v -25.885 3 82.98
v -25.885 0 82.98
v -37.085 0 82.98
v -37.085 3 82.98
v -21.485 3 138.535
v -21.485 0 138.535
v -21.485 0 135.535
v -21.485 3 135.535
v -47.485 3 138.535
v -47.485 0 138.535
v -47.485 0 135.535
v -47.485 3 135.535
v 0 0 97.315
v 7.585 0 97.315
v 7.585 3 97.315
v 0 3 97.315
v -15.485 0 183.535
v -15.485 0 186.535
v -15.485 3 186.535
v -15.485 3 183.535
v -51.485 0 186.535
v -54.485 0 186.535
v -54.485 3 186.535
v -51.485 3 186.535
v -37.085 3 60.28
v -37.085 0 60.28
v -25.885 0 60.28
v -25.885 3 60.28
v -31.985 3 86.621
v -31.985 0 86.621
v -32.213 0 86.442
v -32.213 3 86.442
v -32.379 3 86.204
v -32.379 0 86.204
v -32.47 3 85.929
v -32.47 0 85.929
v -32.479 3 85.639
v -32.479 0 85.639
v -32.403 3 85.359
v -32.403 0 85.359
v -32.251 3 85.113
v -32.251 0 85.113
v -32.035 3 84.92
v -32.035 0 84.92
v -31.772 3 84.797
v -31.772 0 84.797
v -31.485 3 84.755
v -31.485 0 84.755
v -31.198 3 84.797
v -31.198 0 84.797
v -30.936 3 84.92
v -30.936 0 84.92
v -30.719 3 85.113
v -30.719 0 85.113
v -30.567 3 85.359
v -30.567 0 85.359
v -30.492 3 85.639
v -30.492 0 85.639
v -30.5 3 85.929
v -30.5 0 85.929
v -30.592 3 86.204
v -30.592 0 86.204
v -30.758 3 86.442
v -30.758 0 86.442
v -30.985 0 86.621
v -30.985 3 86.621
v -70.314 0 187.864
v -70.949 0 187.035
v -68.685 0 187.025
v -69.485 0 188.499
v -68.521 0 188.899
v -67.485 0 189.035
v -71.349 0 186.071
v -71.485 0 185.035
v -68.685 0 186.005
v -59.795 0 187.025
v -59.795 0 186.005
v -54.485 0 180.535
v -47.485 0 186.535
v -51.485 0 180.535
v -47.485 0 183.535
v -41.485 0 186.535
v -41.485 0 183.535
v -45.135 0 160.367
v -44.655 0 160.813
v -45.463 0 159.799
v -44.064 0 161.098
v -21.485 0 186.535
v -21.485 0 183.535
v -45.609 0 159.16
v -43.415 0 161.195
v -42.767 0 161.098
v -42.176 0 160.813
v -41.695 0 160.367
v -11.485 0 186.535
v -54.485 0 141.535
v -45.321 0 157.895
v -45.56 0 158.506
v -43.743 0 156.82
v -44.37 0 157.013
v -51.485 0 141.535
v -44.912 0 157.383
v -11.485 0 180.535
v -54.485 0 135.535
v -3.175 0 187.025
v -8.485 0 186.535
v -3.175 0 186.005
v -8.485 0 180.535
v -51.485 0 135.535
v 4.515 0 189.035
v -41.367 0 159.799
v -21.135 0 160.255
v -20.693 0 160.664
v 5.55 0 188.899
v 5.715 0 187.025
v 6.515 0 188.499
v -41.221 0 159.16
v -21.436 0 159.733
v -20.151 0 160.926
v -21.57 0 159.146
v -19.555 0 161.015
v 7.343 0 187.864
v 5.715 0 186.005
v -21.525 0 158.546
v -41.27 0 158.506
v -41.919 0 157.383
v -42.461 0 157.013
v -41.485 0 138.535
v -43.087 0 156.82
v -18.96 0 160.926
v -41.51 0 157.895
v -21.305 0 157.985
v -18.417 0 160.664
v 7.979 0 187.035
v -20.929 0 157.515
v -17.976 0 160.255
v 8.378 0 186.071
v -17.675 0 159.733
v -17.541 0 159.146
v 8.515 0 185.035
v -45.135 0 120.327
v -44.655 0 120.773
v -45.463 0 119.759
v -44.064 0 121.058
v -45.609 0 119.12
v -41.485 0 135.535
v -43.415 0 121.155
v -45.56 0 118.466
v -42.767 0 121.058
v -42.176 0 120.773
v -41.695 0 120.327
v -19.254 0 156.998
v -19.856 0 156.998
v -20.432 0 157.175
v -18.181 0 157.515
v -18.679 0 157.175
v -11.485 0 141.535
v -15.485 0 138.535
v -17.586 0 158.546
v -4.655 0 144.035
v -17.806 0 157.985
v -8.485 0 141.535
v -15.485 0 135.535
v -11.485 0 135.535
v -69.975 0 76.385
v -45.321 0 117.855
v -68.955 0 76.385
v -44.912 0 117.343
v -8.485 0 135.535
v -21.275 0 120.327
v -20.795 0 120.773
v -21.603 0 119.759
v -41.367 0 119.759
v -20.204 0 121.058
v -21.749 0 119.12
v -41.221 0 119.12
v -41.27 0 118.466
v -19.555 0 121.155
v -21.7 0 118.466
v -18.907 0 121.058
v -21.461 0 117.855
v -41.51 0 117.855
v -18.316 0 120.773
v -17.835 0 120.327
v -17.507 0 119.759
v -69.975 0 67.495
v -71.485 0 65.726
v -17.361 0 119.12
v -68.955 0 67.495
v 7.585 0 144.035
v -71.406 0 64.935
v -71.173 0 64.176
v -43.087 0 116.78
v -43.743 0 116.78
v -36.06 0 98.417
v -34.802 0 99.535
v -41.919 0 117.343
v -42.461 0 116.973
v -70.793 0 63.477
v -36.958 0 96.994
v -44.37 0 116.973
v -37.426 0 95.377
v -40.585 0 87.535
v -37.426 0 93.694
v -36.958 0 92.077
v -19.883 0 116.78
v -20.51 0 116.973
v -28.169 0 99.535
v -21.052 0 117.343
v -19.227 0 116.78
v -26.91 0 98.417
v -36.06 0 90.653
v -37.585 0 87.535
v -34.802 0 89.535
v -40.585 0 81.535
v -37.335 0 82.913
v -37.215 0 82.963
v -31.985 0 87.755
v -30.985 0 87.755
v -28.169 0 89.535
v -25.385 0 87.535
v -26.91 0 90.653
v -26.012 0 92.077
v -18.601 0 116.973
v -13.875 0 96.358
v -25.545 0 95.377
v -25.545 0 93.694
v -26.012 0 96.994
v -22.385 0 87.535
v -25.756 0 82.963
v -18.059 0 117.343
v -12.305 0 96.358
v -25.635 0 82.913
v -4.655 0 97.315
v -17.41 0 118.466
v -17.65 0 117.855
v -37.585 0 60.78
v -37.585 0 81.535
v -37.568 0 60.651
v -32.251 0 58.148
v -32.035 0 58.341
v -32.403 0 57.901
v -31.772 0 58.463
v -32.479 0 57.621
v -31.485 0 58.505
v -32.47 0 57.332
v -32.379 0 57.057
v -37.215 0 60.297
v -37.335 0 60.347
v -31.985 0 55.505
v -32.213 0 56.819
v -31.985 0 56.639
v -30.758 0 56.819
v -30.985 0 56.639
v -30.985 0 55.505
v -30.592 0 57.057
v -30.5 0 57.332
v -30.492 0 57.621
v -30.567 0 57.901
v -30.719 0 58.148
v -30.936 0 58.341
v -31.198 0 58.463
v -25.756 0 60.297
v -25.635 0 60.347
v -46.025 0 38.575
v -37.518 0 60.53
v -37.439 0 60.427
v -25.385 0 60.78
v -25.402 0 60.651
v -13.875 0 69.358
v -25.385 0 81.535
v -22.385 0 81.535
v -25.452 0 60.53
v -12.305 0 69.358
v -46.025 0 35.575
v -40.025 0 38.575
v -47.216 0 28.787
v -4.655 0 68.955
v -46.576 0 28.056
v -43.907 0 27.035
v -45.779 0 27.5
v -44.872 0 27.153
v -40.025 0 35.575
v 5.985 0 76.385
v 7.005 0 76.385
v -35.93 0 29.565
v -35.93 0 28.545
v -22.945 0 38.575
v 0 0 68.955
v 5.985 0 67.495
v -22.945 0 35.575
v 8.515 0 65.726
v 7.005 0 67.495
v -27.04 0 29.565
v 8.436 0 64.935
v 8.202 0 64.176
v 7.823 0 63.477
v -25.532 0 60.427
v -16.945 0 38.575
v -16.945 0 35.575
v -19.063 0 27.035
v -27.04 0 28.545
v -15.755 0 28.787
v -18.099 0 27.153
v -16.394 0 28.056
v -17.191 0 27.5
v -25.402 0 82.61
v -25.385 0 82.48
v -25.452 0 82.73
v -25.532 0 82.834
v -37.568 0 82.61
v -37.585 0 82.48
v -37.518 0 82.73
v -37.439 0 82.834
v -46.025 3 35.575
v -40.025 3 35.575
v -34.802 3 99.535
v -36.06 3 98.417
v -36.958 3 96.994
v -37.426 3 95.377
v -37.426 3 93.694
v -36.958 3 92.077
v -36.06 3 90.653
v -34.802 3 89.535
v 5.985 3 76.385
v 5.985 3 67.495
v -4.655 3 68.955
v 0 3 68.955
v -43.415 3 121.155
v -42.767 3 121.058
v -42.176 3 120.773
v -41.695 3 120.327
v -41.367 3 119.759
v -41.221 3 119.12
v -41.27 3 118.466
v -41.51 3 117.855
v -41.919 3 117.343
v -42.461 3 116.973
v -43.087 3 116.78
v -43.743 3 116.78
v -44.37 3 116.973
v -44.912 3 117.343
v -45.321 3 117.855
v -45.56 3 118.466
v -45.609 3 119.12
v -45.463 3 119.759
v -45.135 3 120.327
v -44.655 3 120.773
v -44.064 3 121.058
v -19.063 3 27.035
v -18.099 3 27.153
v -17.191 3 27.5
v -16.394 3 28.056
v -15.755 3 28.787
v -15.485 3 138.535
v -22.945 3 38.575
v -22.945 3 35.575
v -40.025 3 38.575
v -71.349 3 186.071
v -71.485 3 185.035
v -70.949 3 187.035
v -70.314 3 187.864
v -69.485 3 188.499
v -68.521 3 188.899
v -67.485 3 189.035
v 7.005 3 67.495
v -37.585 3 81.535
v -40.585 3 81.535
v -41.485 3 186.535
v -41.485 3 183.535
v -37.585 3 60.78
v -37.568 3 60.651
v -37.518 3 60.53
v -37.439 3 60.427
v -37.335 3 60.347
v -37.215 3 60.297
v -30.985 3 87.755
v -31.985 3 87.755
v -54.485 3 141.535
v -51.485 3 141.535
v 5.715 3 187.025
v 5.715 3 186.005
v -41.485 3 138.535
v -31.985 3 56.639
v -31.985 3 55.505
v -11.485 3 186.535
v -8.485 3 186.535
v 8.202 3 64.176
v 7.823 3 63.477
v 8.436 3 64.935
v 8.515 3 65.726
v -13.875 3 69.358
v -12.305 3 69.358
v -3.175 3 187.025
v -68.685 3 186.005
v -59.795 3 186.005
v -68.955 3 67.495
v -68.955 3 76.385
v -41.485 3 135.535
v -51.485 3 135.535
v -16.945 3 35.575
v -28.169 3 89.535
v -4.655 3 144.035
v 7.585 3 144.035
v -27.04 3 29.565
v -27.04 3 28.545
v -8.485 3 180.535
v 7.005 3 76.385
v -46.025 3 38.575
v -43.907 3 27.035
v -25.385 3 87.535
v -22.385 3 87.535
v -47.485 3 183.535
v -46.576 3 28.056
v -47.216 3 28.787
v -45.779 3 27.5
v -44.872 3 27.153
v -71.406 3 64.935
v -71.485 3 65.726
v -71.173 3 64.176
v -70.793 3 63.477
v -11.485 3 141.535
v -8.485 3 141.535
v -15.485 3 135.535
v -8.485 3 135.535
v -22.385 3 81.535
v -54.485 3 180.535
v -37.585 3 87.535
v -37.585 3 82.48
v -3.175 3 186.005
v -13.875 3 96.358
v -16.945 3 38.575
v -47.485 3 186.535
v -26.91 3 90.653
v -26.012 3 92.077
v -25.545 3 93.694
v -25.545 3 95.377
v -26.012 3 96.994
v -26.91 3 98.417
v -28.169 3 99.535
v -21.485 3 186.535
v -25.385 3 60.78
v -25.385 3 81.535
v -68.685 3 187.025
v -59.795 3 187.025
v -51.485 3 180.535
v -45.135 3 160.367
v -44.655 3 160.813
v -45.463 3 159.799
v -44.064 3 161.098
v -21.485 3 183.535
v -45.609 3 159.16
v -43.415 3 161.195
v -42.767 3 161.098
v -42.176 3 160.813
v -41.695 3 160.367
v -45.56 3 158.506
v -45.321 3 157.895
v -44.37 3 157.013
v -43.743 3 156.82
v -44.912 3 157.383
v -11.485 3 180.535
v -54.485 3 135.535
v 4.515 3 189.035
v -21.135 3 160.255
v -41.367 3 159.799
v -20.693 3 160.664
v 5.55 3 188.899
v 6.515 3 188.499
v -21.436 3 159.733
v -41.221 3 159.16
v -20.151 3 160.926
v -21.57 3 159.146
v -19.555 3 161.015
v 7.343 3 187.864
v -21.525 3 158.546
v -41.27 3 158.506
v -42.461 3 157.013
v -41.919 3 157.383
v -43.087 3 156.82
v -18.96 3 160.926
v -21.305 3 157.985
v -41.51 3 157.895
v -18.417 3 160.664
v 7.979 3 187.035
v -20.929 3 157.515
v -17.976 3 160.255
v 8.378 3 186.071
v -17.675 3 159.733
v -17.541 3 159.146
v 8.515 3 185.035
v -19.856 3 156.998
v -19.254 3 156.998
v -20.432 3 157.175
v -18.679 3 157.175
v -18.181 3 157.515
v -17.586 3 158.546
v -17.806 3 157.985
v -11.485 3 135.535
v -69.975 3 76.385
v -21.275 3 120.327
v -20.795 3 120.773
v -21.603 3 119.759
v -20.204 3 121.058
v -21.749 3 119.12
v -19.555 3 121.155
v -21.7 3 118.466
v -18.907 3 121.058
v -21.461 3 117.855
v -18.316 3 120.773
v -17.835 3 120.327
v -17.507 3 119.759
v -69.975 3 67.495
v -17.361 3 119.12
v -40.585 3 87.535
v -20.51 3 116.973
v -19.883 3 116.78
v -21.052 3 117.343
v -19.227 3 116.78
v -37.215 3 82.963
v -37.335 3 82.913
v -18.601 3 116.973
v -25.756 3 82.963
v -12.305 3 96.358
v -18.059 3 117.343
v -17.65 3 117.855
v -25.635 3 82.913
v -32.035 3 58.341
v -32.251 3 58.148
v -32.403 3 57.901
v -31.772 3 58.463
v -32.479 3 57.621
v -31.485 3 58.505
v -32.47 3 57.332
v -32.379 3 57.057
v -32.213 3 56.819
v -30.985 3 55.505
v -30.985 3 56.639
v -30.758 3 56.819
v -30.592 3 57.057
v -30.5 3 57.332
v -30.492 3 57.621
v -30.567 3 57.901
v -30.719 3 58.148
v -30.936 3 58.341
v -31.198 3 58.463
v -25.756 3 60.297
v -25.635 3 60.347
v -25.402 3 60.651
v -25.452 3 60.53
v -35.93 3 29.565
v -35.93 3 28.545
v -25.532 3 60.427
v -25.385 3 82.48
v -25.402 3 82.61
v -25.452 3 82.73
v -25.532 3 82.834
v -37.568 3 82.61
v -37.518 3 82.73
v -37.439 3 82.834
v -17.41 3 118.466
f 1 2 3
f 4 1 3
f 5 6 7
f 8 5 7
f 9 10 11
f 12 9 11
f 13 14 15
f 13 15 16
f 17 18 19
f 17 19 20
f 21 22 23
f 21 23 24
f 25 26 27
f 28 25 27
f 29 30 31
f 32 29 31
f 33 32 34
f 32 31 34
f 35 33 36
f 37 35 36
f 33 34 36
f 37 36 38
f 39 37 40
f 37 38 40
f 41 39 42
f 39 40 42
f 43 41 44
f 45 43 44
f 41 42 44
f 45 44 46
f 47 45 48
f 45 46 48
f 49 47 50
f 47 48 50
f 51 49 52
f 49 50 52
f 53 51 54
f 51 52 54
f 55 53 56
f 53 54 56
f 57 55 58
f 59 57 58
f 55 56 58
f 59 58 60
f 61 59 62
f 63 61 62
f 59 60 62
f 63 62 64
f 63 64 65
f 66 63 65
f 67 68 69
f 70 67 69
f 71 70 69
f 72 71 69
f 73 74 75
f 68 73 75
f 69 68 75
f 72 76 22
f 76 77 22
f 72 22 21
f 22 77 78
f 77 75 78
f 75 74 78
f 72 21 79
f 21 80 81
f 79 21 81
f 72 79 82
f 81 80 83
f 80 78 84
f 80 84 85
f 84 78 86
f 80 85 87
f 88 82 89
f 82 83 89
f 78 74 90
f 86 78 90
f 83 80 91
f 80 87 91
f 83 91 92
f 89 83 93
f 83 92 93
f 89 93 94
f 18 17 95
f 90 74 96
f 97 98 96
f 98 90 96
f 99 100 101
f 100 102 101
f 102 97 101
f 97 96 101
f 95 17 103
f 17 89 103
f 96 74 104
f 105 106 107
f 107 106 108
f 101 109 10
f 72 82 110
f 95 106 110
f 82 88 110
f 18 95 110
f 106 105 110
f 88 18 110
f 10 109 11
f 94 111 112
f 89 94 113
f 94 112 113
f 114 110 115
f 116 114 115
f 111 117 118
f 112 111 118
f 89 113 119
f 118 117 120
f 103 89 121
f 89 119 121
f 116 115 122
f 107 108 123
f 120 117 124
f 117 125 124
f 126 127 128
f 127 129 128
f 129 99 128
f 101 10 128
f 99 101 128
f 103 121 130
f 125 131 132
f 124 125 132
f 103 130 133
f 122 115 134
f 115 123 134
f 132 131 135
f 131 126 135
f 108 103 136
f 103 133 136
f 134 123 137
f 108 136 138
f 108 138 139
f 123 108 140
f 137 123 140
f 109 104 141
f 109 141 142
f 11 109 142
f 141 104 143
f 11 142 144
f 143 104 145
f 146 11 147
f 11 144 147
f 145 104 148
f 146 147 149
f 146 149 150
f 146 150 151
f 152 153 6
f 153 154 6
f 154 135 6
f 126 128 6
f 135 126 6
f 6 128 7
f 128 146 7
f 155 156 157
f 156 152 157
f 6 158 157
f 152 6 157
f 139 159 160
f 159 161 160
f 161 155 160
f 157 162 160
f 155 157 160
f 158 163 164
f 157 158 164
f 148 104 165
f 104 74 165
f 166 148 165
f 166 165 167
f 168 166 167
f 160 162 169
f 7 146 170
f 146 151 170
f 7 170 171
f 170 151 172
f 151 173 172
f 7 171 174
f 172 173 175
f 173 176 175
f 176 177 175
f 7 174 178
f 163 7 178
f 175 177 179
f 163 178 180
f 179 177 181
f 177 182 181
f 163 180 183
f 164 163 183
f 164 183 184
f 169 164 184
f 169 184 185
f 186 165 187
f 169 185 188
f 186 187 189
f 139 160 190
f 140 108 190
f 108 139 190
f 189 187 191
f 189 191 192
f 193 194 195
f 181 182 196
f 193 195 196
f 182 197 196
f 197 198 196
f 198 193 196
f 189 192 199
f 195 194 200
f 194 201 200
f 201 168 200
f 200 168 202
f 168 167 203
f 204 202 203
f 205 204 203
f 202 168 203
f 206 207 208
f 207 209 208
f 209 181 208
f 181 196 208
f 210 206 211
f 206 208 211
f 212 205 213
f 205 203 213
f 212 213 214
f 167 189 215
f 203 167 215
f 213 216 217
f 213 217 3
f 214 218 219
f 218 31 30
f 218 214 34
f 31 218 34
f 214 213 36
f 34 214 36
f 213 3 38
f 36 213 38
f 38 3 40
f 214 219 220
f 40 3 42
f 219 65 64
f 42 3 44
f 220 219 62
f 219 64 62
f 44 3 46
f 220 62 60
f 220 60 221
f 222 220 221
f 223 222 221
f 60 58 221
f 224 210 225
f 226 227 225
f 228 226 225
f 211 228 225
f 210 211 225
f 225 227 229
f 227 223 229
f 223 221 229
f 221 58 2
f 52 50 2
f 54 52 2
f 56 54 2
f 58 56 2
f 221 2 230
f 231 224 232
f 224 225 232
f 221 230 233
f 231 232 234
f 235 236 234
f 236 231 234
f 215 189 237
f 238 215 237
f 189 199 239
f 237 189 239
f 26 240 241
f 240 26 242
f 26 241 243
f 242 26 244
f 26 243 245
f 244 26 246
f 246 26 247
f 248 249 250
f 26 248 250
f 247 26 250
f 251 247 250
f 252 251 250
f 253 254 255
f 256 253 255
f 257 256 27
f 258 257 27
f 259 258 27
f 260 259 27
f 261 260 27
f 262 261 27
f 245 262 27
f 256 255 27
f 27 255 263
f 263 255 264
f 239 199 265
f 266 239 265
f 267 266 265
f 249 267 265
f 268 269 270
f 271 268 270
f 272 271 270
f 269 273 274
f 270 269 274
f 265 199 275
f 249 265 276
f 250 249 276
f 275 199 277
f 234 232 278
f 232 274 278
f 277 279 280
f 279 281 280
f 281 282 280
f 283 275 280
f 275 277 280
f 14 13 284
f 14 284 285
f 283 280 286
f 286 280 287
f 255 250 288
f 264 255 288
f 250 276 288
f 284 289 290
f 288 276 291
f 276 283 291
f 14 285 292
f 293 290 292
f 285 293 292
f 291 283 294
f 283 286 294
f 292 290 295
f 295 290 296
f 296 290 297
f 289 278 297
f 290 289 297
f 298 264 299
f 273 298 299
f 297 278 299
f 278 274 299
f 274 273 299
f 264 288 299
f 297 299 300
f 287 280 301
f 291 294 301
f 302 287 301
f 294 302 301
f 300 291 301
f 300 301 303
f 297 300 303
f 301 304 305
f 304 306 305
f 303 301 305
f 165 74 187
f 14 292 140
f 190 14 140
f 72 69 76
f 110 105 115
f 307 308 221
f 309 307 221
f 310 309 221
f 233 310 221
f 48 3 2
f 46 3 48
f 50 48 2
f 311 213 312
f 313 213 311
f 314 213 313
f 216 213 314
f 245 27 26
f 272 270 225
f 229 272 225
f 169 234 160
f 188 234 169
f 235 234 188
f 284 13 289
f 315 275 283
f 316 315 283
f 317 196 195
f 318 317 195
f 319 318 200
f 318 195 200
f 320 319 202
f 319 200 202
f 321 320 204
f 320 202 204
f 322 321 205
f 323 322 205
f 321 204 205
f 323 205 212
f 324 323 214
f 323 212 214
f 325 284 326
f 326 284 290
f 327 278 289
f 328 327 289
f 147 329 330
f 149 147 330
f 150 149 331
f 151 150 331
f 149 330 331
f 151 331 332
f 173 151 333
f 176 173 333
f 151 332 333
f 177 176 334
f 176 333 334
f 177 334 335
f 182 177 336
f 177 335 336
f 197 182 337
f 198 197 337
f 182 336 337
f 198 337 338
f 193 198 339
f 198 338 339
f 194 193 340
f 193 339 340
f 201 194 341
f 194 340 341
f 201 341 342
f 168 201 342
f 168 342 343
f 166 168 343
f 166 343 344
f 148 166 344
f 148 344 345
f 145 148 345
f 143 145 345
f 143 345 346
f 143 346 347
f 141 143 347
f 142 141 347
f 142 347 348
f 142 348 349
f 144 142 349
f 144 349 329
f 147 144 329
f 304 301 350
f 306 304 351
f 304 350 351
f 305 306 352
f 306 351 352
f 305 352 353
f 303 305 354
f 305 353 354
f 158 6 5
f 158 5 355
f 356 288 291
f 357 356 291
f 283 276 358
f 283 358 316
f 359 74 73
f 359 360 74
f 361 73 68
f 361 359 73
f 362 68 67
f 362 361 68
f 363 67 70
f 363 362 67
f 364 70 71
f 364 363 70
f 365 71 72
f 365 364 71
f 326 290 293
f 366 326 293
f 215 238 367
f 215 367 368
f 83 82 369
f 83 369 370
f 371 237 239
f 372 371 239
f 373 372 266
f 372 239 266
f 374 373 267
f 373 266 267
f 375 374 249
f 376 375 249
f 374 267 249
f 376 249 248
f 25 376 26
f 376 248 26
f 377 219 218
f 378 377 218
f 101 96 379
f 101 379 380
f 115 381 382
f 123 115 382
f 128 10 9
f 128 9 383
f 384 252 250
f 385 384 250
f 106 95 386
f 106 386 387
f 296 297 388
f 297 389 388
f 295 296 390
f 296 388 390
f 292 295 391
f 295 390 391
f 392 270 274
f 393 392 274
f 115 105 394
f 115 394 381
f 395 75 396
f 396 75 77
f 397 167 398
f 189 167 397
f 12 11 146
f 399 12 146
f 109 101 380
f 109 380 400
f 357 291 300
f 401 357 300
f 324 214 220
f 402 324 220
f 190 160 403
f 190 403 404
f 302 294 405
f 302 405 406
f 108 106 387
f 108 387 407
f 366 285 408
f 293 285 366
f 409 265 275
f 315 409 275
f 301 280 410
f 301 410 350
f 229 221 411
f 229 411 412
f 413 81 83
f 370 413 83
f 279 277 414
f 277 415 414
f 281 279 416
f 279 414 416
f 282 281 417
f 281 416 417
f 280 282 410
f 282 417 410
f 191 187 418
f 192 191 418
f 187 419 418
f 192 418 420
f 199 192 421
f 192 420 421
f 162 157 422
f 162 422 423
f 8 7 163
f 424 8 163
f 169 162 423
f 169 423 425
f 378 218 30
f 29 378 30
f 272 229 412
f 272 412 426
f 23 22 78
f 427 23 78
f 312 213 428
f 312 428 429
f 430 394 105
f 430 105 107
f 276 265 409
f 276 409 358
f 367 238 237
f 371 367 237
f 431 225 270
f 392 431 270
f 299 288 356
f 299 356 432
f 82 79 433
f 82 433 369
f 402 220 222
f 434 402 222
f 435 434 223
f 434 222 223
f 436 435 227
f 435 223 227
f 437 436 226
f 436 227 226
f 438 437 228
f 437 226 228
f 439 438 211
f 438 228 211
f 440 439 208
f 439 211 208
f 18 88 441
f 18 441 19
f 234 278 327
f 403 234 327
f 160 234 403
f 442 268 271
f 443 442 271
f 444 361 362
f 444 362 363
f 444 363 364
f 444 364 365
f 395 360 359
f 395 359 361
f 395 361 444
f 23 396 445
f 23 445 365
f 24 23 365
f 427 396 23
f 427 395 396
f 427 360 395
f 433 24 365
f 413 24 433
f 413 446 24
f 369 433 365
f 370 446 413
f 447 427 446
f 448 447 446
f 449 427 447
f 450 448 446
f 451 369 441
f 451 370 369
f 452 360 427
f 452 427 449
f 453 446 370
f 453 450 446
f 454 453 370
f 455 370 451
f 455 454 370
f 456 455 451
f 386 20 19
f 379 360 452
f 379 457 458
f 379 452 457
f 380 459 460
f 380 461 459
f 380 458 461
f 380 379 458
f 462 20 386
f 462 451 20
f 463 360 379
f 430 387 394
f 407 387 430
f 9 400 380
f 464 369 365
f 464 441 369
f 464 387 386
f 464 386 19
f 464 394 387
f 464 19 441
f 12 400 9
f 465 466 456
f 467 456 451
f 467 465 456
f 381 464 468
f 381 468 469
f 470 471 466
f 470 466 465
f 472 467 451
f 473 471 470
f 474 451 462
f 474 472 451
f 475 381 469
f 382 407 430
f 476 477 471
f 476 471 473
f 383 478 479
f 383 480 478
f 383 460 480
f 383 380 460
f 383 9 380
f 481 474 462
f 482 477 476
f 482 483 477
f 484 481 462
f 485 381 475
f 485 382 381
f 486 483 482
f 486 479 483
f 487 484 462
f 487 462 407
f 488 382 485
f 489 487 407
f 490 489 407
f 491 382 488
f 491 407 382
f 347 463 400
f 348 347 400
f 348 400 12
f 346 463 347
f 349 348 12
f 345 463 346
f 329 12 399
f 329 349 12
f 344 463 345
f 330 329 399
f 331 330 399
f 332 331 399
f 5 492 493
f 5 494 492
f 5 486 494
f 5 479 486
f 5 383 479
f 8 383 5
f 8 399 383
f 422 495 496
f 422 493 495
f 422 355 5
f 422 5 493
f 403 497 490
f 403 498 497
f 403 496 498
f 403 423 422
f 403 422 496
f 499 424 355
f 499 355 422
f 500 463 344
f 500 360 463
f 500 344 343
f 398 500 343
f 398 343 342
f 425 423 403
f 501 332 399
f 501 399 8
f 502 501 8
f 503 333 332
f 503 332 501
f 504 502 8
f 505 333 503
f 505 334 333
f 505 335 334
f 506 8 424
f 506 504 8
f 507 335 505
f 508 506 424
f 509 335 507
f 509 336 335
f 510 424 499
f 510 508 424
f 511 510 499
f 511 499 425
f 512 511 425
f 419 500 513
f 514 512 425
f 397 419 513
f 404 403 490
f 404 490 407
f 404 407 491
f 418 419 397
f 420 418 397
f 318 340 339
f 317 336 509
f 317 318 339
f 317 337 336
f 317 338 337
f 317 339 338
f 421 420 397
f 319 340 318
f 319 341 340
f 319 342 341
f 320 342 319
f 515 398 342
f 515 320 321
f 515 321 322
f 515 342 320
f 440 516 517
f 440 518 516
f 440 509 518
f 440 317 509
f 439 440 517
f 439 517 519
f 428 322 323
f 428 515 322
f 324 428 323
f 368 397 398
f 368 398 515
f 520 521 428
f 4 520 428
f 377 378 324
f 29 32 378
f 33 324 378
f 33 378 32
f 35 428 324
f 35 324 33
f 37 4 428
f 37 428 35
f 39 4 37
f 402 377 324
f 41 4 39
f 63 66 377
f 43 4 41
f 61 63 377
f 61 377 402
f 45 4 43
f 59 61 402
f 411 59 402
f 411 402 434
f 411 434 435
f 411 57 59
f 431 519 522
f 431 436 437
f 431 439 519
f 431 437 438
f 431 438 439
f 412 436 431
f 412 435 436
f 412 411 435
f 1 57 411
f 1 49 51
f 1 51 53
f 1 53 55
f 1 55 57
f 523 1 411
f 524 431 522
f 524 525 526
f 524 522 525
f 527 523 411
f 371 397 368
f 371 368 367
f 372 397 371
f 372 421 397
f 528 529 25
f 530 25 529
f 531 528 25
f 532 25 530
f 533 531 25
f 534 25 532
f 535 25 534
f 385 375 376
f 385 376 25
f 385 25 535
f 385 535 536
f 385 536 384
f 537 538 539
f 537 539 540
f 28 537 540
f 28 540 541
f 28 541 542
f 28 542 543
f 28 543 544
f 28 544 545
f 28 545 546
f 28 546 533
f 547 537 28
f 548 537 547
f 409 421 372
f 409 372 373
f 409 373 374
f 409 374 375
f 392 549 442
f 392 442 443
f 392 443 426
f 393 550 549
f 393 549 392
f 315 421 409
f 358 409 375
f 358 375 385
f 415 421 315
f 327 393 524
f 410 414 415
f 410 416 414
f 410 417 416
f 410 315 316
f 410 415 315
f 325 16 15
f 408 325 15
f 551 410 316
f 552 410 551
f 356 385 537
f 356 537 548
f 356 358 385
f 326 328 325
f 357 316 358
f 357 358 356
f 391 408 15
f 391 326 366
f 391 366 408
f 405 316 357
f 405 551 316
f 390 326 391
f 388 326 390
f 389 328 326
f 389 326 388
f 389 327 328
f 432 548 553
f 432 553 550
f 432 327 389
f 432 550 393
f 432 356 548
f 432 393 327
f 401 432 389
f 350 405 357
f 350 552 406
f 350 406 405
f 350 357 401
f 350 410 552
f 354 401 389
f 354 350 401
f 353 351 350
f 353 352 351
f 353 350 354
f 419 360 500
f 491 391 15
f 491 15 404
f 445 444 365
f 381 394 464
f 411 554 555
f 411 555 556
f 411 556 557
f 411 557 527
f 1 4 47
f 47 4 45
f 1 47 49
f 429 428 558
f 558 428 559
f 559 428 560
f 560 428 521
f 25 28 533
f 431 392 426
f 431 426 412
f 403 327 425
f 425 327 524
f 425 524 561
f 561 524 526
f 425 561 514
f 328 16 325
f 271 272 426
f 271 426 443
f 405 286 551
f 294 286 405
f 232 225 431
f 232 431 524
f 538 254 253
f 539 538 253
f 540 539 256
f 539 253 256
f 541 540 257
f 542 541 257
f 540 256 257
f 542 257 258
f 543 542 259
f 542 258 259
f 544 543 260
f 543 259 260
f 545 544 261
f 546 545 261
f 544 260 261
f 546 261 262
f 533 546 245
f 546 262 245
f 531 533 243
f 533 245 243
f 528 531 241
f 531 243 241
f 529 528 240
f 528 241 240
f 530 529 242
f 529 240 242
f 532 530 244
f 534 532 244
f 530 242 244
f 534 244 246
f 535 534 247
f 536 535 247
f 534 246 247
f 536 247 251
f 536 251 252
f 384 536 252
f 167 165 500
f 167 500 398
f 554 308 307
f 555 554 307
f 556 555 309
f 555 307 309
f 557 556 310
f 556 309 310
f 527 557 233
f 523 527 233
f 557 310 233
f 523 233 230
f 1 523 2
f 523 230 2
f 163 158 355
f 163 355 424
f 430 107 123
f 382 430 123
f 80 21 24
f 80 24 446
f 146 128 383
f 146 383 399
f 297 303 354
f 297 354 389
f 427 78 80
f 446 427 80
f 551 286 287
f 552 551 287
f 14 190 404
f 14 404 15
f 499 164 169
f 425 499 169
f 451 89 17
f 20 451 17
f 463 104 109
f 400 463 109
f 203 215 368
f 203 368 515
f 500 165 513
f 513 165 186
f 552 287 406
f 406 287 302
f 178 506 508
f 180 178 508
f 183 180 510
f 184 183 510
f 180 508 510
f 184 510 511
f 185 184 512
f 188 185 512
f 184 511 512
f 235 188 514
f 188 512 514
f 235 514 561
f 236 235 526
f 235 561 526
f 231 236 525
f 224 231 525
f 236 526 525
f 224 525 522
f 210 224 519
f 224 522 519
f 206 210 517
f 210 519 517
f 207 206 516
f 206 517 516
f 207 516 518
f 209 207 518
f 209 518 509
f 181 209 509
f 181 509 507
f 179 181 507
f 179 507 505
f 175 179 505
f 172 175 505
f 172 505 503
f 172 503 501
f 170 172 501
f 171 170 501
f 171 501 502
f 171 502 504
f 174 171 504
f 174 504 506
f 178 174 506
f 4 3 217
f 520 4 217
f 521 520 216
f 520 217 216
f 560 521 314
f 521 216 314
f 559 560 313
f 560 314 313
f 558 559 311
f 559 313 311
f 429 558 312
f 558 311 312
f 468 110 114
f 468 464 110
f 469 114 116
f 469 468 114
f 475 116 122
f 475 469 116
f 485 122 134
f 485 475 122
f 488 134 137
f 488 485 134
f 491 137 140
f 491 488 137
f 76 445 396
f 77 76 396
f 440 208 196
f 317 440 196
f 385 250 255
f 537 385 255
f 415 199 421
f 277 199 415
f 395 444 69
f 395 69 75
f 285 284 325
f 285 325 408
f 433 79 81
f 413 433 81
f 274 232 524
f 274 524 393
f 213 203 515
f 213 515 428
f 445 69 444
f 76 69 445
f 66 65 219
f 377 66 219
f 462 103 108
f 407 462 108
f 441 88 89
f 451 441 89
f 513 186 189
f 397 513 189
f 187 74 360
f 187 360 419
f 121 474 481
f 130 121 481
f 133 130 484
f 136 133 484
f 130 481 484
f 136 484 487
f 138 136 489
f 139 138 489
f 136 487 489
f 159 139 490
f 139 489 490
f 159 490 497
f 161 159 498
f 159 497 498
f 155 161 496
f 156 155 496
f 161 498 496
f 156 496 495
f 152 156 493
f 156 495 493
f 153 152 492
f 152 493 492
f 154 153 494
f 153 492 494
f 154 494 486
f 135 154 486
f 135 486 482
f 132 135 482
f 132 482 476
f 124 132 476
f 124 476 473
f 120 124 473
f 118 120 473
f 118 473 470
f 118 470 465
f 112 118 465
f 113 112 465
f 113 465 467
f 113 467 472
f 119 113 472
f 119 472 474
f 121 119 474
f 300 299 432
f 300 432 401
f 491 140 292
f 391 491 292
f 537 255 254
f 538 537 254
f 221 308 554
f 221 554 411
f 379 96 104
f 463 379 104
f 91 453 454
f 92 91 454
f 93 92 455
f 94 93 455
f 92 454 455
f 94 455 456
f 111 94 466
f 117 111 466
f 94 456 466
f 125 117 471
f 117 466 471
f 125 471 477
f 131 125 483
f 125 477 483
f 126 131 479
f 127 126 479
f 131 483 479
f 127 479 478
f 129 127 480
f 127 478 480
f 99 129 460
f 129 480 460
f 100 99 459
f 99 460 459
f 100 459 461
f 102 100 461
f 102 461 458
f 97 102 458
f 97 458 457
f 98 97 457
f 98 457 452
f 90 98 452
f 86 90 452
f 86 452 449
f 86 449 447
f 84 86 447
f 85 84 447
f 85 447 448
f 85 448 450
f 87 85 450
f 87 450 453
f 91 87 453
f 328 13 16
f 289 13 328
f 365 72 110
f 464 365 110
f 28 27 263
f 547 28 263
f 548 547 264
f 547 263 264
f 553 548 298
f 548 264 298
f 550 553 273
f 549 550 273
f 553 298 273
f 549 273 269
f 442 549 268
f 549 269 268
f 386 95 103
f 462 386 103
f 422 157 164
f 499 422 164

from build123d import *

# Parameters (mm, degrees)
BOSS_EXTRUDE5_OUTLINE_W   = 80
BOSS_EXTRUDE5_OUTLINE_H   = 162
BOSS_EXTRUDE5_OUTLINE_W_2 = 1.57
BOSS_EXTRUDE5_OUTLINE_H_2 = 27
BOSS_EXTRUDE5_DEPTH       = 3
SKETCH8_R                 = 2.2
SKETCH8_R_2               = 2.02
CUT_EXTRUDE1_DEPTH        = 10
CUT_EXTRUDE2_DEPTH        = 10
CUT_EXTRUDE2_DEPTH_BACK   = 3
SKETCH9_W                 = 3
SKETCH9_H                 = 6
SKETCH9_W_2               = 6
SKETCH9_H_2               = 3
SKETCH9_W_3               = 1.02
SKETCH9_H_3               = 8.89
SKETCH9_W_4               = 8.89
SKETCH9_H_4               = 1.02
SKETCH9_W_5               = 4.655263111
SKETCH9_H_5               = 28.36
FILLET3_R                 = 4


# Read off the part's stored shape, not the designer's step: Boss-Extrude5
with BuildPart() as part:
    # Boss-Extrude5 outline → Boss-Extrude5 (new body)
    with BuildSketch(Plane(origin=(0, 0, 0), x_dir=(1, 0, 0), z_dir=(0, 1, 0))):
        with Locations((-31.485263111, -108.03530565)):
            Rectangle(BOSS_EXTRUDE5_OUTLINE_W, BOSS_EXTRUDE5_OUTLINE_H)
        with BuildLine():
            Line((-34.801887901, -89.53530565), (-28.16863832, -89.53530565))
            ThreePointArc((-28.16863832, -89.53530565), (-25.485263111, -94.53530565), (-28.16863832, -99.53530565))
            Line((-28.16863832, -99.53530565), (-34.801887901, -99.53530565))
            ThreePointArc((-34.801887901, -99.53530565), (-37.485263111, -94.53530565), (-34.801887901, -89.53530565))
        make_face(mode=Mode.SUBTRACT)
        with BuildLine():
            Line((-30.985263111, -86.621331054), (-30.985263111, -87.75530565))
            Line((-30.985263111, -87.75530565), (-31.985263111, -87.75530565))
            Line((-31.985263111, -87.75530565), (-31.985263111, -86.621331054))
            ThreePointArc((-31.985263111, -86.621331054), (-31.485263111, -84.75530565), (-30.985263111, -86.621331054))
        make_face(mode=Mode.SUBTRACT)
        with BuildLine():
            Line((-25.885263111, -82.98030565), (-37.085263111, -82.98030565))
            ThreePointArc((-37.085263111, -82.98030565), (-37.438816501, -82.833859041), (-37.585263111, -82.48030565))
            Line((-37.585263111, -82.48030565), (-37.585263111, -60.78030565))
            ThreePointArc((-37.585263111, -60.78030565), (-37.438816502, -60.42675226), (-37.085263111, -60.28030565))
            Line((-37.085263111, -60.28030565), (-25.885263111, -60.28030565))
            ThreePointArc((-25.885263111, -60.28030565), (-25.53170972, -60.426752259), (-25.385263111, -60.78030565))
            Line((-25.385263111, -60.78030565), (-25.385263111, -82.48030565))
            ThreePointArc((-25.385263111, -82.48030565), (-25.53170972, -82.833859041), (-25.885263111, -82.98030565))
        make_face(mode=Mode.SUBTRACT)
        with Locations((-13.090263111, -82.857662255)):
            Rectangle(BOSS_EXTRUDE5_OUTLINE_W_2, BOSS_EXTRUDE5_OUTLINE_H_2, mode=Mode.SUBTRACT)
        with BuildLine():
            ThreePointArc((-30.985263111, -56.639280246), (-31.485263111, -58.50530565), (-31.985263111, -56.639280246))
            Line((-31.985263111, -56.639280246), (-31.985263111, -55.50530565))
            Line((-31.985263111, -55.50530565), (-30.985263111, -55.50530565))
            Line((-30.985263111, -55.50530565), (-30.985263111, -56.639280246))
        make_face(mode=Mode.SUBTRACT)
    extrude(amount=BOSS_EXTRUDE5_DEPTH)

    # Sketch8 → Cut-Extrude1 (cut)
    with BuildSketch(Plane(origin=(0, 3, 0), x_dir=(1, 0, 0), z_dir=(0, 1, 0))):
        with Locations(Location((-43.415263111, -118.95530565, 0), (0, 0, 270))):
            Circle(SKETCH8_R)
        with Locations(Location((-19.555263111, -118.95530565, 0), (0, 0, 270))):
            Circle(SKETCH8_R)
        with Locations(Location((-19.555263111, -158.99530565, 0), (0, 0, 270))):
            Circle(SKETCH8_R_2)
        with Locations(Location((-43.415263111, -158.99530565, 0), (0, 0, 270))):
            Circle(SKETCH8_R)
    extrude(amount=-CUT_EXTRUDE1_DEPTH, mode=Mode.SUBTRACT)

    # Sketch9 → Cut-Extrude2 (cut, two sides: drawn at the far end of the back side and taken through both)
    with BuildSketch(Plane(origin=(0, 3, 0), x_dir=(1, 0, 0), z_dir=(0, 1, 0)).offset(-CUT_EXTRUDE2_DEPTH_BACK)):
        with Locations((-52.985263111, -183.53530565)):
            Rectangle(SKETCH9_W, SKETCH9_H)
        with Locations((-9.985263111, -183.53530565)):
            Rectangle(SKETCH9_W, SKETCH9_H)
        with Locations((-9.985263111, -138.53530565)):
            Rectangle(SKETCH9_W, SKETCH9_H)
        with Locations((-52.985263111, -138.53530565)):
            Rectangle(SKETCH9_W, SKETCH9_H)
        Polygon((-37.585263111, -81.53530565), (-40.585263111, -81.53530565), (-40.585263111, -87.53530565), (-37.585263111, -87.53530565), (-37.585263111, -82.48030565), align=None)
        Polygon((-25.385263111, -87.53530565), (-22.385263111, -87.53530565), (-22.385263111, -81.53530565), (-25.385263111, -81.53530565), (-25.385263111, -82.48030565), align=None)
        with Locations((-44.485263111, -185.03530565)):
            Rectangle(SKETCH9_W_2, SKETCH9_H_2)
        with Locations((-18.485263111, -185.03530565)):
            Rectangle(SKETCH9_W_2, SKETCH9_H_2)
        with Locations((-44.485263111, -137.03530565)):
            Rectangle(SKETCH9_W_2, SKETCH9_H_2)
        with Locations((-18.485263111, -137.03530565)):
            Rectangle(SKETCH9_W_2, SKETCH9_H_2)
        with Locations((-69.465263111, -71.94030565)):
            Rectangle(SKETCH9_W_3, SKETCH9_H_3)
        with Locations((-31.485263111, -29.05530565)):
            Rectangle(SKETCH9_W_4, SKETCH9_H_4)
        with Locations((6.494736889, -71.94030565)):
            Rectangle(SKETCH9_W_3, SKETCH9_H_3)
        with Locations((-64.240263111, -186.51530565)):
            Rectangle(SKETCH9_W_4, SKETCH9_H_4)
        with Locations((1.269736889, -186.51530565)):
            Rectangle(SKETCH9_W_4, SKETCH9_H_4)
        Polygon((0, -97.31530565), (-4.655263111, -97.31530565), (-4.655263111, -144.03530565), (7.584736889, -144.03530565), (7.584736889, -97.31530565), align=None)
        with Locations((-2.327631556, -83.13530565)):
            Rectangle(SKETCH9_W_5, SKETCH9_H_5)
        with Locations((-43.025263111, -37.07530565)):
            Rectangle(SKETCH9_W_2, SKETCH9_H_2)
        with Locations((-19.945263111, -37.07530565)):
            Rectangle(SKETCH9_W_2, SKETCH9_H_2)
        Polygon((-16.945263111, -27.03530565), (8.514736889, -64.49530565), (8.514736889, -27.03530565), align=None)
        Polygon((-71.485263111, -27.03530565), (-71.485263111, -64.49530565), (-46.025263111, -27.03530565), align=None)
    extrude(amount=CUT_EXTRUDE2_DEPTH + CUT_EXTRUDE2_DEPTH_BACK, mode=Mode.SUBTRACT)

    # Fillet3
    fillet3_edges = [part.edges().sort_by_distance(p)[0] for p in [
        (-16.945263111, 1.5, 27.03530565),
        (8.514736889, 1.5, 64.49530565),
        (-71.485263111, 1.5, 64.49530565),
        (-46.025263111, 1.5, 27.03530565),
        (-71.485263111, 1.5, 189.03530565),
        (8.514736889, 1.5, 189.03530565),
    ]]
    fillet(fillet3_edges, radius=FILLET3_R)


solid = part.part
